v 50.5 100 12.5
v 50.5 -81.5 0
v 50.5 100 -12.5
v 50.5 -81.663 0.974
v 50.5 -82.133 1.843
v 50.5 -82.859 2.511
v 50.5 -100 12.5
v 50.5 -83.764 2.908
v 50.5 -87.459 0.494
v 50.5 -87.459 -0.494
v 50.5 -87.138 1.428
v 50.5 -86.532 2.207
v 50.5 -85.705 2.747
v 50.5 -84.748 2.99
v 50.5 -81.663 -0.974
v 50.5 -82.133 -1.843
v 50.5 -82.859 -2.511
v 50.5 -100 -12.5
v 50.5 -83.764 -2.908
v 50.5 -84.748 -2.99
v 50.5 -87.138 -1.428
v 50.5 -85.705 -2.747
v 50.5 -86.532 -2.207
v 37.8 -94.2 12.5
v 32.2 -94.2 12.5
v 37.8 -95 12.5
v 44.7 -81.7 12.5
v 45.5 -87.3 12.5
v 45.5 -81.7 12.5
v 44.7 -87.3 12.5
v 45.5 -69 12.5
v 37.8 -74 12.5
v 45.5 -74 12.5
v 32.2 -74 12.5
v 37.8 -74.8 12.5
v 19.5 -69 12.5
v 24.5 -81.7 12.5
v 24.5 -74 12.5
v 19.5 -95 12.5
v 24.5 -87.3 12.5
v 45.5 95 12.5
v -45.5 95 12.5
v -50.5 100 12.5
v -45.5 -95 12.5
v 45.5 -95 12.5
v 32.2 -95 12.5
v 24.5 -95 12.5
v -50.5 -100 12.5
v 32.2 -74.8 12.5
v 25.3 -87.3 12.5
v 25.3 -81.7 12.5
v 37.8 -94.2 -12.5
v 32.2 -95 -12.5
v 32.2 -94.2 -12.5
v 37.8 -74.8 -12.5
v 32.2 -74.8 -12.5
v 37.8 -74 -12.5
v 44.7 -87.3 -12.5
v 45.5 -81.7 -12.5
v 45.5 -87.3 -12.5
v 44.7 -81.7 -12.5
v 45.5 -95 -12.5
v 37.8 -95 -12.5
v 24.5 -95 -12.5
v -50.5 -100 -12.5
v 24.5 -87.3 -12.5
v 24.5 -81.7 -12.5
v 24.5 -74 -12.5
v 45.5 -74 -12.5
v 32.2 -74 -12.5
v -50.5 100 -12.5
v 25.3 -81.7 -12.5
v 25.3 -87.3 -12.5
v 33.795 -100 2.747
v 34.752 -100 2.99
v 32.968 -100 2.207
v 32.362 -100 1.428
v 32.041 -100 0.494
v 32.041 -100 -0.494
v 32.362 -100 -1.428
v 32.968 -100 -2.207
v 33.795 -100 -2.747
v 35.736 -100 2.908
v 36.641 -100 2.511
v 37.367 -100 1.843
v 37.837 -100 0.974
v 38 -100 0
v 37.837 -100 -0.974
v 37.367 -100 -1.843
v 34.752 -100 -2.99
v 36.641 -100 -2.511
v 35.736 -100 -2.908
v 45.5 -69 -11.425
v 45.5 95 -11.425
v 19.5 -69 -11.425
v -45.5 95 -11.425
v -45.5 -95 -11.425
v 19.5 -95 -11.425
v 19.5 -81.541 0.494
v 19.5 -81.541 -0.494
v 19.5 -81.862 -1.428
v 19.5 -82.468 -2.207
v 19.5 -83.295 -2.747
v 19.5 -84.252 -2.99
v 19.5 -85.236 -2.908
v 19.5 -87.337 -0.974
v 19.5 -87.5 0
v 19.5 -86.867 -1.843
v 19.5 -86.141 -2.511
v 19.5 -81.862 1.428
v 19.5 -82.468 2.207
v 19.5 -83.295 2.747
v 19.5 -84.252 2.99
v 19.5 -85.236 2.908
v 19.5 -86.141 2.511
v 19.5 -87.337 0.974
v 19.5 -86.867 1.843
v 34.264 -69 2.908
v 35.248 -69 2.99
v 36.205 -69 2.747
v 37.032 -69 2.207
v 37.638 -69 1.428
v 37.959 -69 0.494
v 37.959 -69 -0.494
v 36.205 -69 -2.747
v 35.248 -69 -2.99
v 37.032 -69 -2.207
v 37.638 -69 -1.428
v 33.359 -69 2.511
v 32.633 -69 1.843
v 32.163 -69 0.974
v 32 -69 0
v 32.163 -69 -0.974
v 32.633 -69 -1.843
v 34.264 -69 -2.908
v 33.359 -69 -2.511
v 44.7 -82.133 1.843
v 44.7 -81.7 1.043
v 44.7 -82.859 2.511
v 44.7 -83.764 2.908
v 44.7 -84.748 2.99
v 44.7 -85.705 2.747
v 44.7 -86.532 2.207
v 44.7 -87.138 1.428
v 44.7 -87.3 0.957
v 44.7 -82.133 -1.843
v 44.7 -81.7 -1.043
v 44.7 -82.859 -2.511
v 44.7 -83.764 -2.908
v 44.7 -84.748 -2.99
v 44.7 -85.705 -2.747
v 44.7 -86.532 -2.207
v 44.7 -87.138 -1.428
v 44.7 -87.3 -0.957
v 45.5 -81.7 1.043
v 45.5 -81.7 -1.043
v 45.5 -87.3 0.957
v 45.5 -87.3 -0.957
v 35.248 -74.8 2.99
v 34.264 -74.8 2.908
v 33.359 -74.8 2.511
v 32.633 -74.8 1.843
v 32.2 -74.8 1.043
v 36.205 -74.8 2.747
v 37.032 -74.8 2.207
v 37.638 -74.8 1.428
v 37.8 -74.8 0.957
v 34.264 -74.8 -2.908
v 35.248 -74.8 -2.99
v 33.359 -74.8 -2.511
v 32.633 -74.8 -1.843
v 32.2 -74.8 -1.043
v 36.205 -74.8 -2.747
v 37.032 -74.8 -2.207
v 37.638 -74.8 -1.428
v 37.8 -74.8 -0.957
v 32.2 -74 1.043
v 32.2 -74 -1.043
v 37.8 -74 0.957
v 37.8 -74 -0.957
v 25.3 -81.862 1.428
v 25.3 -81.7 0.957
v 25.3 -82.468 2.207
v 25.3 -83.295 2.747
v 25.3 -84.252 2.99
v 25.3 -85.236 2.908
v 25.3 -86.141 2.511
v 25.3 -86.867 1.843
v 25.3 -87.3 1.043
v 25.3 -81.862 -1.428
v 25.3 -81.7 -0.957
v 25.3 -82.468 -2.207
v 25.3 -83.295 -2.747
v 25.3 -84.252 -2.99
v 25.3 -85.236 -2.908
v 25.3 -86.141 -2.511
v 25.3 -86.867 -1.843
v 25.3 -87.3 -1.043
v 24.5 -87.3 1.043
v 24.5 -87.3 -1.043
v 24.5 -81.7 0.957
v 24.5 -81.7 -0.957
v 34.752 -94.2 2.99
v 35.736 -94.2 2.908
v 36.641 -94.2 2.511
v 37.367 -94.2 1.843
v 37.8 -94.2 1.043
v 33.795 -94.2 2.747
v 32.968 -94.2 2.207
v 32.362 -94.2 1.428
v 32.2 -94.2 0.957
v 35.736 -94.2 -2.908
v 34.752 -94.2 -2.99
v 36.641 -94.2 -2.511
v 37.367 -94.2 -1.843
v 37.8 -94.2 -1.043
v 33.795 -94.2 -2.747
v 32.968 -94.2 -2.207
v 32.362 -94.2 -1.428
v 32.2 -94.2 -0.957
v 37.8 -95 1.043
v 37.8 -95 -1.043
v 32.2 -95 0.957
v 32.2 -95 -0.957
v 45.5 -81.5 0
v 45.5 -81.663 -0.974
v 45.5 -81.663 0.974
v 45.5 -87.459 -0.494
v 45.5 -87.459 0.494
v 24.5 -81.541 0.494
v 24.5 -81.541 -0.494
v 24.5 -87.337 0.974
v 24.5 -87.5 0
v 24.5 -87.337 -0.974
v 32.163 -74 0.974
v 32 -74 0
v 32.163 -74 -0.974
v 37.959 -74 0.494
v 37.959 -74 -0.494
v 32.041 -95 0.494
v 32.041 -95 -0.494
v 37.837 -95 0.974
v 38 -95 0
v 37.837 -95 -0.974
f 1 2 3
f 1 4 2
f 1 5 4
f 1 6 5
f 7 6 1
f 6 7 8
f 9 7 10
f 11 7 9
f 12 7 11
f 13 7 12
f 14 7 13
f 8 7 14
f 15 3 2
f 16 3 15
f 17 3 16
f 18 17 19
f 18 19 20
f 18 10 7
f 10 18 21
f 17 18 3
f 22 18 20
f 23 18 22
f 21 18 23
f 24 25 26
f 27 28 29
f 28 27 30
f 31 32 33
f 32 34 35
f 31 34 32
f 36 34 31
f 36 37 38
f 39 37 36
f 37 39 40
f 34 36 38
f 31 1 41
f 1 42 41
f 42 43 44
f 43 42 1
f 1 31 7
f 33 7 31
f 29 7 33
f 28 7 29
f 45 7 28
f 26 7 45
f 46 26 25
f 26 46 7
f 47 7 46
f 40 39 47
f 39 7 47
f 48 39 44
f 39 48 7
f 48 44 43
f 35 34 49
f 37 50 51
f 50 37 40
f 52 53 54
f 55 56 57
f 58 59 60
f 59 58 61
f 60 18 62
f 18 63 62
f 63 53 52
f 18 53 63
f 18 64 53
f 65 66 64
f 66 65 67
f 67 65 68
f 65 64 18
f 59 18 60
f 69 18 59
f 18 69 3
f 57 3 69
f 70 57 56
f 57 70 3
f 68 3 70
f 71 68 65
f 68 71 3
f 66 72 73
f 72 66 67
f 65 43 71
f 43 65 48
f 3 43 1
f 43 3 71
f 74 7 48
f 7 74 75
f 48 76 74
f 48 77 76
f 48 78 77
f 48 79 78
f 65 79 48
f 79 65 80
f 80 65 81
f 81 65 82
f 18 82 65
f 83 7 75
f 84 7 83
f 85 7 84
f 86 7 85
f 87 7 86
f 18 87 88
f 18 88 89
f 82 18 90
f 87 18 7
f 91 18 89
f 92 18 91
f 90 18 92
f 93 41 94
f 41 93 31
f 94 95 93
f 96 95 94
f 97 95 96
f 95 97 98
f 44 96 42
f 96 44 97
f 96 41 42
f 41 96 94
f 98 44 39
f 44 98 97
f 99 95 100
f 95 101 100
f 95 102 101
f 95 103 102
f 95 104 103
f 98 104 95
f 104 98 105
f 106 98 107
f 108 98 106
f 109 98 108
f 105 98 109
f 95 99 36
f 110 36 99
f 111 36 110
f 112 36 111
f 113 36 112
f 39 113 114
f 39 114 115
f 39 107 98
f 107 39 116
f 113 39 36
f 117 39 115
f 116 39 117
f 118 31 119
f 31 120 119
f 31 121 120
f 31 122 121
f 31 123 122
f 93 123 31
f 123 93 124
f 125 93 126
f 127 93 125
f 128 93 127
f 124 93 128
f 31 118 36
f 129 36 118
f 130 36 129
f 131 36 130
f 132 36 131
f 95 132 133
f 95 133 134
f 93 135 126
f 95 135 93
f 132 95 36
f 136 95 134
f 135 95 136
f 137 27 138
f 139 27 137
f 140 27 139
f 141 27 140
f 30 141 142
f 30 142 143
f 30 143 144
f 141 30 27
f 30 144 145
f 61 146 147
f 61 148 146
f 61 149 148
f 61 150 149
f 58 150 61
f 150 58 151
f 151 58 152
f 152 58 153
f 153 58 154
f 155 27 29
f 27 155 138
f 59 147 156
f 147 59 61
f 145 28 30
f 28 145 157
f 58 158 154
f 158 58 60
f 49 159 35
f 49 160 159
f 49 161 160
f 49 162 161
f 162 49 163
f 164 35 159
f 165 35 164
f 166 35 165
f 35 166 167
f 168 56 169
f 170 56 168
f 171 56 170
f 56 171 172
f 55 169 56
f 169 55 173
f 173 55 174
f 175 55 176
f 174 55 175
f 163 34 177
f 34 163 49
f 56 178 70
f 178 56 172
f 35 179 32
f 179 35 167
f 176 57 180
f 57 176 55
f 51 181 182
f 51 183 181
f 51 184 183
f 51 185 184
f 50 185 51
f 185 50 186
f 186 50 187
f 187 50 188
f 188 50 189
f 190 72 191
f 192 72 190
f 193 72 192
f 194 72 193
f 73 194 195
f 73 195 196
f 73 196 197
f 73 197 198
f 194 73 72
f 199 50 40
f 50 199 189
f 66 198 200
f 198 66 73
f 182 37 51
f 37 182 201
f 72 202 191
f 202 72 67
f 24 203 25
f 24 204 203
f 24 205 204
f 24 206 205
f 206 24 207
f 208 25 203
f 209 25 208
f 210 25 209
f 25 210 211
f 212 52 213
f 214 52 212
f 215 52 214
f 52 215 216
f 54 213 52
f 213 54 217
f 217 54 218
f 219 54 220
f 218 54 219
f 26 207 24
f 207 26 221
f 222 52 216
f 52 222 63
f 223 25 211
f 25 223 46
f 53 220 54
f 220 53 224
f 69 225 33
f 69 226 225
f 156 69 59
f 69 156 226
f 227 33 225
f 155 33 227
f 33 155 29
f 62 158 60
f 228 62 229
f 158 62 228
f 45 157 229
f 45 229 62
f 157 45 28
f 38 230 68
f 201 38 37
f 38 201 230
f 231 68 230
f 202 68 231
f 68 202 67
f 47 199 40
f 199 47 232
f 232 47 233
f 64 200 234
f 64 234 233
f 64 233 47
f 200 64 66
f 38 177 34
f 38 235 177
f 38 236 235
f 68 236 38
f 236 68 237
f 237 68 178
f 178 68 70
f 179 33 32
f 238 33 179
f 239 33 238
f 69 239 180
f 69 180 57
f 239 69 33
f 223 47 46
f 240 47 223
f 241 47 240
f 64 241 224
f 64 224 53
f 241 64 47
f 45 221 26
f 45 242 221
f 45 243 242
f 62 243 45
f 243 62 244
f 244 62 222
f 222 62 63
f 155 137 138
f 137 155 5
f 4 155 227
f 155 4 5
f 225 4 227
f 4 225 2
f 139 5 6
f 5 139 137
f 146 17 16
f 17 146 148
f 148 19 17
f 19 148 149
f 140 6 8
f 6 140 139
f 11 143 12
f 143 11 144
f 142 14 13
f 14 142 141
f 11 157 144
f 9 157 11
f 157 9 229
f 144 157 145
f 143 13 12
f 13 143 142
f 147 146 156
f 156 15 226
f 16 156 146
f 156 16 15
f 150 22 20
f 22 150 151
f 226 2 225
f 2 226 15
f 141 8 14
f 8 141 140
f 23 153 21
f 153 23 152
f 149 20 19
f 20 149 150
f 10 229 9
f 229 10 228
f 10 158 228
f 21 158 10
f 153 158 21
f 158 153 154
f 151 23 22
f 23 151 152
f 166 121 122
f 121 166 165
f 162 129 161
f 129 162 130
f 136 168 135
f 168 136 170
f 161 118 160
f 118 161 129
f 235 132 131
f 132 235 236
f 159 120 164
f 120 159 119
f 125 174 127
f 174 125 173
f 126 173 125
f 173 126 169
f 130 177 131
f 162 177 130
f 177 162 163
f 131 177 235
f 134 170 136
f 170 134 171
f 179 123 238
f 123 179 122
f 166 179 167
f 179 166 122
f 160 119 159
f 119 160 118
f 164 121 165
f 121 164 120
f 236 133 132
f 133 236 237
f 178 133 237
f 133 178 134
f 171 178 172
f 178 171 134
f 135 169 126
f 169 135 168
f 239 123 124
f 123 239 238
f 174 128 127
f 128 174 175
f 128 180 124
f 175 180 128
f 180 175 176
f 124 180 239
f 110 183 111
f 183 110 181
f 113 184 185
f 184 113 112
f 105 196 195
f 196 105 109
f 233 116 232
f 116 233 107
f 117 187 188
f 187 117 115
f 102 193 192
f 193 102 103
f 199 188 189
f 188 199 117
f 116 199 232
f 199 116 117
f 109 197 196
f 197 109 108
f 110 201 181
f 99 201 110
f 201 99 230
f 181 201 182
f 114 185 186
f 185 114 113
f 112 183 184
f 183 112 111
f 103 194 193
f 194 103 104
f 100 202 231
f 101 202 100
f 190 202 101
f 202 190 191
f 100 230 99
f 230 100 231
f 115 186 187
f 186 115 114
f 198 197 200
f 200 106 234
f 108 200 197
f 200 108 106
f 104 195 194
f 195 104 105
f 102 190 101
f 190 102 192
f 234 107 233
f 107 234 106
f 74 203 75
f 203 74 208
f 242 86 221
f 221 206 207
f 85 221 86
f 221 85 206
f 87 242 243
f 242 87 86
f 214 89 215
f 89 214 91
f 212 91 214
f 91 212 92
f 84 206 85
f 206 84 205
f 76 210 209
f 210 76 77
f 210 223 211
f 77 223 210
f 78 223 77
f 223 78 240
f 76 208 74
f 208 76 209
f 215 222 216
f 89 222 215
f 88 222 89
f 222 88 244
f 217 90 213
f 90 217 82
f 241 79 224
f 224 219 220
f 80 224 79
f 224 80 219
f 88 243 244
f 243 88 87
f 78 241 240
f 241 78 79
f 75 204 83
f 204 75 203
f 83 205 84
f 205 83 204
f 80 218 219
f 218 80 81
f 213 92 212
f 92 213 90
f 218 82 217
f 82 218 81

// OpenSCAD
include <BOSL/constants.scad>
use <BOSL/transforms.scad>
use <BOSL/shapes.scad>
// use <BOSL/masks.scad>
// use <BOSL/metric_screws.scad>

_2020_center_depth = 0.8;
_2020_top_center_depth = 2;
_2020_center_width = 5.5;
_2020_width = 21;
_2020_thickness = 5;
_2020_hole_radius = 6/2; // 6mm for M5 bolts+slop

floor_thickness = 2;
wall_thickness = 5;

$fa=1;
$fs=1;

platform_width = 60+_2020_width+wall_thickness*2;
platform_depth = 180+wall_thickness*2;
wall_height = 25;


module clamp_negative() {
    difference() {
        cuboid([_2020_width, _2020_width, wall_height+.1]);
        zrot_copies(n=4, r=_2020_width/2-_2020_center_depth/2+.05) {
            cuboid([_2020_center_depth+.1, _2020_center_width+.1, wall_height+.2]);
        }
    }
    zrot_copies(n=4, r=_2020_width/2) {
        cyl(r=_2020_hole_radius, h=_2020_width/2+_2020_center_depth/2+wall_thickness/2, orient=ORIENT_X);
    }
}

module clamp_hole() {
    up(wall_height/2)
    difference() {
        union() {
            difference() {
                cuboid([_2020_width+wall_thickness*2, _2020_width+wall_thickness*2, wall_height]);
                cuboid([_2020_width, _2020_width, wall_height+.1]);
            }
            zrot_copies(n=4, r=_2020_width/2-_2020_center_depth/2) {
                cuboid([_2020_center_depth, _2020_center_width, wall_height]);
            }
        }
        zrot_copies(n=4, r=_2020_width/2) {
            cyl(r=_2020_hole_radius, h=_2020_width/2+_2020_center_depth/2+wall_thickness/2, orient=ORIENT_X);
        }
    }
}

module platform() {
    difference() {
        union() {
            // outer wall
            difference() {
                cuboid([platform_width+wall_thickness*2, platform_depth+wall_thickness*2, wall_height]);

                up(floor_thickness/2+.1)
                cuboid([platform_width, platform_depth, wall_height+.05]);
            }
            // 2020 wall
            right(platform_width/2+wall_thickness-_2020_width/2-wall_thickness)
            fwd(platform_depth/2+wall_thickness-_2020_width/2-wall_thickness)
            cuboid([_2020_width+wall_thickness*2, _2020_width+wall_thickness*2, wall_height]);
        }
        
        right(platform_width/2+wall_thickness-_2020_width/2-wall_thickness)
        fwd(platform_depth/2+wall_thickness-_2020_width/2-wall_thickness)
        clamp_negative();
    }
    
}

// left(_2020_width/2+wall_thickness)
// back(_2020_width/2+wall_thickness)
// clamp_hole();

platform();
